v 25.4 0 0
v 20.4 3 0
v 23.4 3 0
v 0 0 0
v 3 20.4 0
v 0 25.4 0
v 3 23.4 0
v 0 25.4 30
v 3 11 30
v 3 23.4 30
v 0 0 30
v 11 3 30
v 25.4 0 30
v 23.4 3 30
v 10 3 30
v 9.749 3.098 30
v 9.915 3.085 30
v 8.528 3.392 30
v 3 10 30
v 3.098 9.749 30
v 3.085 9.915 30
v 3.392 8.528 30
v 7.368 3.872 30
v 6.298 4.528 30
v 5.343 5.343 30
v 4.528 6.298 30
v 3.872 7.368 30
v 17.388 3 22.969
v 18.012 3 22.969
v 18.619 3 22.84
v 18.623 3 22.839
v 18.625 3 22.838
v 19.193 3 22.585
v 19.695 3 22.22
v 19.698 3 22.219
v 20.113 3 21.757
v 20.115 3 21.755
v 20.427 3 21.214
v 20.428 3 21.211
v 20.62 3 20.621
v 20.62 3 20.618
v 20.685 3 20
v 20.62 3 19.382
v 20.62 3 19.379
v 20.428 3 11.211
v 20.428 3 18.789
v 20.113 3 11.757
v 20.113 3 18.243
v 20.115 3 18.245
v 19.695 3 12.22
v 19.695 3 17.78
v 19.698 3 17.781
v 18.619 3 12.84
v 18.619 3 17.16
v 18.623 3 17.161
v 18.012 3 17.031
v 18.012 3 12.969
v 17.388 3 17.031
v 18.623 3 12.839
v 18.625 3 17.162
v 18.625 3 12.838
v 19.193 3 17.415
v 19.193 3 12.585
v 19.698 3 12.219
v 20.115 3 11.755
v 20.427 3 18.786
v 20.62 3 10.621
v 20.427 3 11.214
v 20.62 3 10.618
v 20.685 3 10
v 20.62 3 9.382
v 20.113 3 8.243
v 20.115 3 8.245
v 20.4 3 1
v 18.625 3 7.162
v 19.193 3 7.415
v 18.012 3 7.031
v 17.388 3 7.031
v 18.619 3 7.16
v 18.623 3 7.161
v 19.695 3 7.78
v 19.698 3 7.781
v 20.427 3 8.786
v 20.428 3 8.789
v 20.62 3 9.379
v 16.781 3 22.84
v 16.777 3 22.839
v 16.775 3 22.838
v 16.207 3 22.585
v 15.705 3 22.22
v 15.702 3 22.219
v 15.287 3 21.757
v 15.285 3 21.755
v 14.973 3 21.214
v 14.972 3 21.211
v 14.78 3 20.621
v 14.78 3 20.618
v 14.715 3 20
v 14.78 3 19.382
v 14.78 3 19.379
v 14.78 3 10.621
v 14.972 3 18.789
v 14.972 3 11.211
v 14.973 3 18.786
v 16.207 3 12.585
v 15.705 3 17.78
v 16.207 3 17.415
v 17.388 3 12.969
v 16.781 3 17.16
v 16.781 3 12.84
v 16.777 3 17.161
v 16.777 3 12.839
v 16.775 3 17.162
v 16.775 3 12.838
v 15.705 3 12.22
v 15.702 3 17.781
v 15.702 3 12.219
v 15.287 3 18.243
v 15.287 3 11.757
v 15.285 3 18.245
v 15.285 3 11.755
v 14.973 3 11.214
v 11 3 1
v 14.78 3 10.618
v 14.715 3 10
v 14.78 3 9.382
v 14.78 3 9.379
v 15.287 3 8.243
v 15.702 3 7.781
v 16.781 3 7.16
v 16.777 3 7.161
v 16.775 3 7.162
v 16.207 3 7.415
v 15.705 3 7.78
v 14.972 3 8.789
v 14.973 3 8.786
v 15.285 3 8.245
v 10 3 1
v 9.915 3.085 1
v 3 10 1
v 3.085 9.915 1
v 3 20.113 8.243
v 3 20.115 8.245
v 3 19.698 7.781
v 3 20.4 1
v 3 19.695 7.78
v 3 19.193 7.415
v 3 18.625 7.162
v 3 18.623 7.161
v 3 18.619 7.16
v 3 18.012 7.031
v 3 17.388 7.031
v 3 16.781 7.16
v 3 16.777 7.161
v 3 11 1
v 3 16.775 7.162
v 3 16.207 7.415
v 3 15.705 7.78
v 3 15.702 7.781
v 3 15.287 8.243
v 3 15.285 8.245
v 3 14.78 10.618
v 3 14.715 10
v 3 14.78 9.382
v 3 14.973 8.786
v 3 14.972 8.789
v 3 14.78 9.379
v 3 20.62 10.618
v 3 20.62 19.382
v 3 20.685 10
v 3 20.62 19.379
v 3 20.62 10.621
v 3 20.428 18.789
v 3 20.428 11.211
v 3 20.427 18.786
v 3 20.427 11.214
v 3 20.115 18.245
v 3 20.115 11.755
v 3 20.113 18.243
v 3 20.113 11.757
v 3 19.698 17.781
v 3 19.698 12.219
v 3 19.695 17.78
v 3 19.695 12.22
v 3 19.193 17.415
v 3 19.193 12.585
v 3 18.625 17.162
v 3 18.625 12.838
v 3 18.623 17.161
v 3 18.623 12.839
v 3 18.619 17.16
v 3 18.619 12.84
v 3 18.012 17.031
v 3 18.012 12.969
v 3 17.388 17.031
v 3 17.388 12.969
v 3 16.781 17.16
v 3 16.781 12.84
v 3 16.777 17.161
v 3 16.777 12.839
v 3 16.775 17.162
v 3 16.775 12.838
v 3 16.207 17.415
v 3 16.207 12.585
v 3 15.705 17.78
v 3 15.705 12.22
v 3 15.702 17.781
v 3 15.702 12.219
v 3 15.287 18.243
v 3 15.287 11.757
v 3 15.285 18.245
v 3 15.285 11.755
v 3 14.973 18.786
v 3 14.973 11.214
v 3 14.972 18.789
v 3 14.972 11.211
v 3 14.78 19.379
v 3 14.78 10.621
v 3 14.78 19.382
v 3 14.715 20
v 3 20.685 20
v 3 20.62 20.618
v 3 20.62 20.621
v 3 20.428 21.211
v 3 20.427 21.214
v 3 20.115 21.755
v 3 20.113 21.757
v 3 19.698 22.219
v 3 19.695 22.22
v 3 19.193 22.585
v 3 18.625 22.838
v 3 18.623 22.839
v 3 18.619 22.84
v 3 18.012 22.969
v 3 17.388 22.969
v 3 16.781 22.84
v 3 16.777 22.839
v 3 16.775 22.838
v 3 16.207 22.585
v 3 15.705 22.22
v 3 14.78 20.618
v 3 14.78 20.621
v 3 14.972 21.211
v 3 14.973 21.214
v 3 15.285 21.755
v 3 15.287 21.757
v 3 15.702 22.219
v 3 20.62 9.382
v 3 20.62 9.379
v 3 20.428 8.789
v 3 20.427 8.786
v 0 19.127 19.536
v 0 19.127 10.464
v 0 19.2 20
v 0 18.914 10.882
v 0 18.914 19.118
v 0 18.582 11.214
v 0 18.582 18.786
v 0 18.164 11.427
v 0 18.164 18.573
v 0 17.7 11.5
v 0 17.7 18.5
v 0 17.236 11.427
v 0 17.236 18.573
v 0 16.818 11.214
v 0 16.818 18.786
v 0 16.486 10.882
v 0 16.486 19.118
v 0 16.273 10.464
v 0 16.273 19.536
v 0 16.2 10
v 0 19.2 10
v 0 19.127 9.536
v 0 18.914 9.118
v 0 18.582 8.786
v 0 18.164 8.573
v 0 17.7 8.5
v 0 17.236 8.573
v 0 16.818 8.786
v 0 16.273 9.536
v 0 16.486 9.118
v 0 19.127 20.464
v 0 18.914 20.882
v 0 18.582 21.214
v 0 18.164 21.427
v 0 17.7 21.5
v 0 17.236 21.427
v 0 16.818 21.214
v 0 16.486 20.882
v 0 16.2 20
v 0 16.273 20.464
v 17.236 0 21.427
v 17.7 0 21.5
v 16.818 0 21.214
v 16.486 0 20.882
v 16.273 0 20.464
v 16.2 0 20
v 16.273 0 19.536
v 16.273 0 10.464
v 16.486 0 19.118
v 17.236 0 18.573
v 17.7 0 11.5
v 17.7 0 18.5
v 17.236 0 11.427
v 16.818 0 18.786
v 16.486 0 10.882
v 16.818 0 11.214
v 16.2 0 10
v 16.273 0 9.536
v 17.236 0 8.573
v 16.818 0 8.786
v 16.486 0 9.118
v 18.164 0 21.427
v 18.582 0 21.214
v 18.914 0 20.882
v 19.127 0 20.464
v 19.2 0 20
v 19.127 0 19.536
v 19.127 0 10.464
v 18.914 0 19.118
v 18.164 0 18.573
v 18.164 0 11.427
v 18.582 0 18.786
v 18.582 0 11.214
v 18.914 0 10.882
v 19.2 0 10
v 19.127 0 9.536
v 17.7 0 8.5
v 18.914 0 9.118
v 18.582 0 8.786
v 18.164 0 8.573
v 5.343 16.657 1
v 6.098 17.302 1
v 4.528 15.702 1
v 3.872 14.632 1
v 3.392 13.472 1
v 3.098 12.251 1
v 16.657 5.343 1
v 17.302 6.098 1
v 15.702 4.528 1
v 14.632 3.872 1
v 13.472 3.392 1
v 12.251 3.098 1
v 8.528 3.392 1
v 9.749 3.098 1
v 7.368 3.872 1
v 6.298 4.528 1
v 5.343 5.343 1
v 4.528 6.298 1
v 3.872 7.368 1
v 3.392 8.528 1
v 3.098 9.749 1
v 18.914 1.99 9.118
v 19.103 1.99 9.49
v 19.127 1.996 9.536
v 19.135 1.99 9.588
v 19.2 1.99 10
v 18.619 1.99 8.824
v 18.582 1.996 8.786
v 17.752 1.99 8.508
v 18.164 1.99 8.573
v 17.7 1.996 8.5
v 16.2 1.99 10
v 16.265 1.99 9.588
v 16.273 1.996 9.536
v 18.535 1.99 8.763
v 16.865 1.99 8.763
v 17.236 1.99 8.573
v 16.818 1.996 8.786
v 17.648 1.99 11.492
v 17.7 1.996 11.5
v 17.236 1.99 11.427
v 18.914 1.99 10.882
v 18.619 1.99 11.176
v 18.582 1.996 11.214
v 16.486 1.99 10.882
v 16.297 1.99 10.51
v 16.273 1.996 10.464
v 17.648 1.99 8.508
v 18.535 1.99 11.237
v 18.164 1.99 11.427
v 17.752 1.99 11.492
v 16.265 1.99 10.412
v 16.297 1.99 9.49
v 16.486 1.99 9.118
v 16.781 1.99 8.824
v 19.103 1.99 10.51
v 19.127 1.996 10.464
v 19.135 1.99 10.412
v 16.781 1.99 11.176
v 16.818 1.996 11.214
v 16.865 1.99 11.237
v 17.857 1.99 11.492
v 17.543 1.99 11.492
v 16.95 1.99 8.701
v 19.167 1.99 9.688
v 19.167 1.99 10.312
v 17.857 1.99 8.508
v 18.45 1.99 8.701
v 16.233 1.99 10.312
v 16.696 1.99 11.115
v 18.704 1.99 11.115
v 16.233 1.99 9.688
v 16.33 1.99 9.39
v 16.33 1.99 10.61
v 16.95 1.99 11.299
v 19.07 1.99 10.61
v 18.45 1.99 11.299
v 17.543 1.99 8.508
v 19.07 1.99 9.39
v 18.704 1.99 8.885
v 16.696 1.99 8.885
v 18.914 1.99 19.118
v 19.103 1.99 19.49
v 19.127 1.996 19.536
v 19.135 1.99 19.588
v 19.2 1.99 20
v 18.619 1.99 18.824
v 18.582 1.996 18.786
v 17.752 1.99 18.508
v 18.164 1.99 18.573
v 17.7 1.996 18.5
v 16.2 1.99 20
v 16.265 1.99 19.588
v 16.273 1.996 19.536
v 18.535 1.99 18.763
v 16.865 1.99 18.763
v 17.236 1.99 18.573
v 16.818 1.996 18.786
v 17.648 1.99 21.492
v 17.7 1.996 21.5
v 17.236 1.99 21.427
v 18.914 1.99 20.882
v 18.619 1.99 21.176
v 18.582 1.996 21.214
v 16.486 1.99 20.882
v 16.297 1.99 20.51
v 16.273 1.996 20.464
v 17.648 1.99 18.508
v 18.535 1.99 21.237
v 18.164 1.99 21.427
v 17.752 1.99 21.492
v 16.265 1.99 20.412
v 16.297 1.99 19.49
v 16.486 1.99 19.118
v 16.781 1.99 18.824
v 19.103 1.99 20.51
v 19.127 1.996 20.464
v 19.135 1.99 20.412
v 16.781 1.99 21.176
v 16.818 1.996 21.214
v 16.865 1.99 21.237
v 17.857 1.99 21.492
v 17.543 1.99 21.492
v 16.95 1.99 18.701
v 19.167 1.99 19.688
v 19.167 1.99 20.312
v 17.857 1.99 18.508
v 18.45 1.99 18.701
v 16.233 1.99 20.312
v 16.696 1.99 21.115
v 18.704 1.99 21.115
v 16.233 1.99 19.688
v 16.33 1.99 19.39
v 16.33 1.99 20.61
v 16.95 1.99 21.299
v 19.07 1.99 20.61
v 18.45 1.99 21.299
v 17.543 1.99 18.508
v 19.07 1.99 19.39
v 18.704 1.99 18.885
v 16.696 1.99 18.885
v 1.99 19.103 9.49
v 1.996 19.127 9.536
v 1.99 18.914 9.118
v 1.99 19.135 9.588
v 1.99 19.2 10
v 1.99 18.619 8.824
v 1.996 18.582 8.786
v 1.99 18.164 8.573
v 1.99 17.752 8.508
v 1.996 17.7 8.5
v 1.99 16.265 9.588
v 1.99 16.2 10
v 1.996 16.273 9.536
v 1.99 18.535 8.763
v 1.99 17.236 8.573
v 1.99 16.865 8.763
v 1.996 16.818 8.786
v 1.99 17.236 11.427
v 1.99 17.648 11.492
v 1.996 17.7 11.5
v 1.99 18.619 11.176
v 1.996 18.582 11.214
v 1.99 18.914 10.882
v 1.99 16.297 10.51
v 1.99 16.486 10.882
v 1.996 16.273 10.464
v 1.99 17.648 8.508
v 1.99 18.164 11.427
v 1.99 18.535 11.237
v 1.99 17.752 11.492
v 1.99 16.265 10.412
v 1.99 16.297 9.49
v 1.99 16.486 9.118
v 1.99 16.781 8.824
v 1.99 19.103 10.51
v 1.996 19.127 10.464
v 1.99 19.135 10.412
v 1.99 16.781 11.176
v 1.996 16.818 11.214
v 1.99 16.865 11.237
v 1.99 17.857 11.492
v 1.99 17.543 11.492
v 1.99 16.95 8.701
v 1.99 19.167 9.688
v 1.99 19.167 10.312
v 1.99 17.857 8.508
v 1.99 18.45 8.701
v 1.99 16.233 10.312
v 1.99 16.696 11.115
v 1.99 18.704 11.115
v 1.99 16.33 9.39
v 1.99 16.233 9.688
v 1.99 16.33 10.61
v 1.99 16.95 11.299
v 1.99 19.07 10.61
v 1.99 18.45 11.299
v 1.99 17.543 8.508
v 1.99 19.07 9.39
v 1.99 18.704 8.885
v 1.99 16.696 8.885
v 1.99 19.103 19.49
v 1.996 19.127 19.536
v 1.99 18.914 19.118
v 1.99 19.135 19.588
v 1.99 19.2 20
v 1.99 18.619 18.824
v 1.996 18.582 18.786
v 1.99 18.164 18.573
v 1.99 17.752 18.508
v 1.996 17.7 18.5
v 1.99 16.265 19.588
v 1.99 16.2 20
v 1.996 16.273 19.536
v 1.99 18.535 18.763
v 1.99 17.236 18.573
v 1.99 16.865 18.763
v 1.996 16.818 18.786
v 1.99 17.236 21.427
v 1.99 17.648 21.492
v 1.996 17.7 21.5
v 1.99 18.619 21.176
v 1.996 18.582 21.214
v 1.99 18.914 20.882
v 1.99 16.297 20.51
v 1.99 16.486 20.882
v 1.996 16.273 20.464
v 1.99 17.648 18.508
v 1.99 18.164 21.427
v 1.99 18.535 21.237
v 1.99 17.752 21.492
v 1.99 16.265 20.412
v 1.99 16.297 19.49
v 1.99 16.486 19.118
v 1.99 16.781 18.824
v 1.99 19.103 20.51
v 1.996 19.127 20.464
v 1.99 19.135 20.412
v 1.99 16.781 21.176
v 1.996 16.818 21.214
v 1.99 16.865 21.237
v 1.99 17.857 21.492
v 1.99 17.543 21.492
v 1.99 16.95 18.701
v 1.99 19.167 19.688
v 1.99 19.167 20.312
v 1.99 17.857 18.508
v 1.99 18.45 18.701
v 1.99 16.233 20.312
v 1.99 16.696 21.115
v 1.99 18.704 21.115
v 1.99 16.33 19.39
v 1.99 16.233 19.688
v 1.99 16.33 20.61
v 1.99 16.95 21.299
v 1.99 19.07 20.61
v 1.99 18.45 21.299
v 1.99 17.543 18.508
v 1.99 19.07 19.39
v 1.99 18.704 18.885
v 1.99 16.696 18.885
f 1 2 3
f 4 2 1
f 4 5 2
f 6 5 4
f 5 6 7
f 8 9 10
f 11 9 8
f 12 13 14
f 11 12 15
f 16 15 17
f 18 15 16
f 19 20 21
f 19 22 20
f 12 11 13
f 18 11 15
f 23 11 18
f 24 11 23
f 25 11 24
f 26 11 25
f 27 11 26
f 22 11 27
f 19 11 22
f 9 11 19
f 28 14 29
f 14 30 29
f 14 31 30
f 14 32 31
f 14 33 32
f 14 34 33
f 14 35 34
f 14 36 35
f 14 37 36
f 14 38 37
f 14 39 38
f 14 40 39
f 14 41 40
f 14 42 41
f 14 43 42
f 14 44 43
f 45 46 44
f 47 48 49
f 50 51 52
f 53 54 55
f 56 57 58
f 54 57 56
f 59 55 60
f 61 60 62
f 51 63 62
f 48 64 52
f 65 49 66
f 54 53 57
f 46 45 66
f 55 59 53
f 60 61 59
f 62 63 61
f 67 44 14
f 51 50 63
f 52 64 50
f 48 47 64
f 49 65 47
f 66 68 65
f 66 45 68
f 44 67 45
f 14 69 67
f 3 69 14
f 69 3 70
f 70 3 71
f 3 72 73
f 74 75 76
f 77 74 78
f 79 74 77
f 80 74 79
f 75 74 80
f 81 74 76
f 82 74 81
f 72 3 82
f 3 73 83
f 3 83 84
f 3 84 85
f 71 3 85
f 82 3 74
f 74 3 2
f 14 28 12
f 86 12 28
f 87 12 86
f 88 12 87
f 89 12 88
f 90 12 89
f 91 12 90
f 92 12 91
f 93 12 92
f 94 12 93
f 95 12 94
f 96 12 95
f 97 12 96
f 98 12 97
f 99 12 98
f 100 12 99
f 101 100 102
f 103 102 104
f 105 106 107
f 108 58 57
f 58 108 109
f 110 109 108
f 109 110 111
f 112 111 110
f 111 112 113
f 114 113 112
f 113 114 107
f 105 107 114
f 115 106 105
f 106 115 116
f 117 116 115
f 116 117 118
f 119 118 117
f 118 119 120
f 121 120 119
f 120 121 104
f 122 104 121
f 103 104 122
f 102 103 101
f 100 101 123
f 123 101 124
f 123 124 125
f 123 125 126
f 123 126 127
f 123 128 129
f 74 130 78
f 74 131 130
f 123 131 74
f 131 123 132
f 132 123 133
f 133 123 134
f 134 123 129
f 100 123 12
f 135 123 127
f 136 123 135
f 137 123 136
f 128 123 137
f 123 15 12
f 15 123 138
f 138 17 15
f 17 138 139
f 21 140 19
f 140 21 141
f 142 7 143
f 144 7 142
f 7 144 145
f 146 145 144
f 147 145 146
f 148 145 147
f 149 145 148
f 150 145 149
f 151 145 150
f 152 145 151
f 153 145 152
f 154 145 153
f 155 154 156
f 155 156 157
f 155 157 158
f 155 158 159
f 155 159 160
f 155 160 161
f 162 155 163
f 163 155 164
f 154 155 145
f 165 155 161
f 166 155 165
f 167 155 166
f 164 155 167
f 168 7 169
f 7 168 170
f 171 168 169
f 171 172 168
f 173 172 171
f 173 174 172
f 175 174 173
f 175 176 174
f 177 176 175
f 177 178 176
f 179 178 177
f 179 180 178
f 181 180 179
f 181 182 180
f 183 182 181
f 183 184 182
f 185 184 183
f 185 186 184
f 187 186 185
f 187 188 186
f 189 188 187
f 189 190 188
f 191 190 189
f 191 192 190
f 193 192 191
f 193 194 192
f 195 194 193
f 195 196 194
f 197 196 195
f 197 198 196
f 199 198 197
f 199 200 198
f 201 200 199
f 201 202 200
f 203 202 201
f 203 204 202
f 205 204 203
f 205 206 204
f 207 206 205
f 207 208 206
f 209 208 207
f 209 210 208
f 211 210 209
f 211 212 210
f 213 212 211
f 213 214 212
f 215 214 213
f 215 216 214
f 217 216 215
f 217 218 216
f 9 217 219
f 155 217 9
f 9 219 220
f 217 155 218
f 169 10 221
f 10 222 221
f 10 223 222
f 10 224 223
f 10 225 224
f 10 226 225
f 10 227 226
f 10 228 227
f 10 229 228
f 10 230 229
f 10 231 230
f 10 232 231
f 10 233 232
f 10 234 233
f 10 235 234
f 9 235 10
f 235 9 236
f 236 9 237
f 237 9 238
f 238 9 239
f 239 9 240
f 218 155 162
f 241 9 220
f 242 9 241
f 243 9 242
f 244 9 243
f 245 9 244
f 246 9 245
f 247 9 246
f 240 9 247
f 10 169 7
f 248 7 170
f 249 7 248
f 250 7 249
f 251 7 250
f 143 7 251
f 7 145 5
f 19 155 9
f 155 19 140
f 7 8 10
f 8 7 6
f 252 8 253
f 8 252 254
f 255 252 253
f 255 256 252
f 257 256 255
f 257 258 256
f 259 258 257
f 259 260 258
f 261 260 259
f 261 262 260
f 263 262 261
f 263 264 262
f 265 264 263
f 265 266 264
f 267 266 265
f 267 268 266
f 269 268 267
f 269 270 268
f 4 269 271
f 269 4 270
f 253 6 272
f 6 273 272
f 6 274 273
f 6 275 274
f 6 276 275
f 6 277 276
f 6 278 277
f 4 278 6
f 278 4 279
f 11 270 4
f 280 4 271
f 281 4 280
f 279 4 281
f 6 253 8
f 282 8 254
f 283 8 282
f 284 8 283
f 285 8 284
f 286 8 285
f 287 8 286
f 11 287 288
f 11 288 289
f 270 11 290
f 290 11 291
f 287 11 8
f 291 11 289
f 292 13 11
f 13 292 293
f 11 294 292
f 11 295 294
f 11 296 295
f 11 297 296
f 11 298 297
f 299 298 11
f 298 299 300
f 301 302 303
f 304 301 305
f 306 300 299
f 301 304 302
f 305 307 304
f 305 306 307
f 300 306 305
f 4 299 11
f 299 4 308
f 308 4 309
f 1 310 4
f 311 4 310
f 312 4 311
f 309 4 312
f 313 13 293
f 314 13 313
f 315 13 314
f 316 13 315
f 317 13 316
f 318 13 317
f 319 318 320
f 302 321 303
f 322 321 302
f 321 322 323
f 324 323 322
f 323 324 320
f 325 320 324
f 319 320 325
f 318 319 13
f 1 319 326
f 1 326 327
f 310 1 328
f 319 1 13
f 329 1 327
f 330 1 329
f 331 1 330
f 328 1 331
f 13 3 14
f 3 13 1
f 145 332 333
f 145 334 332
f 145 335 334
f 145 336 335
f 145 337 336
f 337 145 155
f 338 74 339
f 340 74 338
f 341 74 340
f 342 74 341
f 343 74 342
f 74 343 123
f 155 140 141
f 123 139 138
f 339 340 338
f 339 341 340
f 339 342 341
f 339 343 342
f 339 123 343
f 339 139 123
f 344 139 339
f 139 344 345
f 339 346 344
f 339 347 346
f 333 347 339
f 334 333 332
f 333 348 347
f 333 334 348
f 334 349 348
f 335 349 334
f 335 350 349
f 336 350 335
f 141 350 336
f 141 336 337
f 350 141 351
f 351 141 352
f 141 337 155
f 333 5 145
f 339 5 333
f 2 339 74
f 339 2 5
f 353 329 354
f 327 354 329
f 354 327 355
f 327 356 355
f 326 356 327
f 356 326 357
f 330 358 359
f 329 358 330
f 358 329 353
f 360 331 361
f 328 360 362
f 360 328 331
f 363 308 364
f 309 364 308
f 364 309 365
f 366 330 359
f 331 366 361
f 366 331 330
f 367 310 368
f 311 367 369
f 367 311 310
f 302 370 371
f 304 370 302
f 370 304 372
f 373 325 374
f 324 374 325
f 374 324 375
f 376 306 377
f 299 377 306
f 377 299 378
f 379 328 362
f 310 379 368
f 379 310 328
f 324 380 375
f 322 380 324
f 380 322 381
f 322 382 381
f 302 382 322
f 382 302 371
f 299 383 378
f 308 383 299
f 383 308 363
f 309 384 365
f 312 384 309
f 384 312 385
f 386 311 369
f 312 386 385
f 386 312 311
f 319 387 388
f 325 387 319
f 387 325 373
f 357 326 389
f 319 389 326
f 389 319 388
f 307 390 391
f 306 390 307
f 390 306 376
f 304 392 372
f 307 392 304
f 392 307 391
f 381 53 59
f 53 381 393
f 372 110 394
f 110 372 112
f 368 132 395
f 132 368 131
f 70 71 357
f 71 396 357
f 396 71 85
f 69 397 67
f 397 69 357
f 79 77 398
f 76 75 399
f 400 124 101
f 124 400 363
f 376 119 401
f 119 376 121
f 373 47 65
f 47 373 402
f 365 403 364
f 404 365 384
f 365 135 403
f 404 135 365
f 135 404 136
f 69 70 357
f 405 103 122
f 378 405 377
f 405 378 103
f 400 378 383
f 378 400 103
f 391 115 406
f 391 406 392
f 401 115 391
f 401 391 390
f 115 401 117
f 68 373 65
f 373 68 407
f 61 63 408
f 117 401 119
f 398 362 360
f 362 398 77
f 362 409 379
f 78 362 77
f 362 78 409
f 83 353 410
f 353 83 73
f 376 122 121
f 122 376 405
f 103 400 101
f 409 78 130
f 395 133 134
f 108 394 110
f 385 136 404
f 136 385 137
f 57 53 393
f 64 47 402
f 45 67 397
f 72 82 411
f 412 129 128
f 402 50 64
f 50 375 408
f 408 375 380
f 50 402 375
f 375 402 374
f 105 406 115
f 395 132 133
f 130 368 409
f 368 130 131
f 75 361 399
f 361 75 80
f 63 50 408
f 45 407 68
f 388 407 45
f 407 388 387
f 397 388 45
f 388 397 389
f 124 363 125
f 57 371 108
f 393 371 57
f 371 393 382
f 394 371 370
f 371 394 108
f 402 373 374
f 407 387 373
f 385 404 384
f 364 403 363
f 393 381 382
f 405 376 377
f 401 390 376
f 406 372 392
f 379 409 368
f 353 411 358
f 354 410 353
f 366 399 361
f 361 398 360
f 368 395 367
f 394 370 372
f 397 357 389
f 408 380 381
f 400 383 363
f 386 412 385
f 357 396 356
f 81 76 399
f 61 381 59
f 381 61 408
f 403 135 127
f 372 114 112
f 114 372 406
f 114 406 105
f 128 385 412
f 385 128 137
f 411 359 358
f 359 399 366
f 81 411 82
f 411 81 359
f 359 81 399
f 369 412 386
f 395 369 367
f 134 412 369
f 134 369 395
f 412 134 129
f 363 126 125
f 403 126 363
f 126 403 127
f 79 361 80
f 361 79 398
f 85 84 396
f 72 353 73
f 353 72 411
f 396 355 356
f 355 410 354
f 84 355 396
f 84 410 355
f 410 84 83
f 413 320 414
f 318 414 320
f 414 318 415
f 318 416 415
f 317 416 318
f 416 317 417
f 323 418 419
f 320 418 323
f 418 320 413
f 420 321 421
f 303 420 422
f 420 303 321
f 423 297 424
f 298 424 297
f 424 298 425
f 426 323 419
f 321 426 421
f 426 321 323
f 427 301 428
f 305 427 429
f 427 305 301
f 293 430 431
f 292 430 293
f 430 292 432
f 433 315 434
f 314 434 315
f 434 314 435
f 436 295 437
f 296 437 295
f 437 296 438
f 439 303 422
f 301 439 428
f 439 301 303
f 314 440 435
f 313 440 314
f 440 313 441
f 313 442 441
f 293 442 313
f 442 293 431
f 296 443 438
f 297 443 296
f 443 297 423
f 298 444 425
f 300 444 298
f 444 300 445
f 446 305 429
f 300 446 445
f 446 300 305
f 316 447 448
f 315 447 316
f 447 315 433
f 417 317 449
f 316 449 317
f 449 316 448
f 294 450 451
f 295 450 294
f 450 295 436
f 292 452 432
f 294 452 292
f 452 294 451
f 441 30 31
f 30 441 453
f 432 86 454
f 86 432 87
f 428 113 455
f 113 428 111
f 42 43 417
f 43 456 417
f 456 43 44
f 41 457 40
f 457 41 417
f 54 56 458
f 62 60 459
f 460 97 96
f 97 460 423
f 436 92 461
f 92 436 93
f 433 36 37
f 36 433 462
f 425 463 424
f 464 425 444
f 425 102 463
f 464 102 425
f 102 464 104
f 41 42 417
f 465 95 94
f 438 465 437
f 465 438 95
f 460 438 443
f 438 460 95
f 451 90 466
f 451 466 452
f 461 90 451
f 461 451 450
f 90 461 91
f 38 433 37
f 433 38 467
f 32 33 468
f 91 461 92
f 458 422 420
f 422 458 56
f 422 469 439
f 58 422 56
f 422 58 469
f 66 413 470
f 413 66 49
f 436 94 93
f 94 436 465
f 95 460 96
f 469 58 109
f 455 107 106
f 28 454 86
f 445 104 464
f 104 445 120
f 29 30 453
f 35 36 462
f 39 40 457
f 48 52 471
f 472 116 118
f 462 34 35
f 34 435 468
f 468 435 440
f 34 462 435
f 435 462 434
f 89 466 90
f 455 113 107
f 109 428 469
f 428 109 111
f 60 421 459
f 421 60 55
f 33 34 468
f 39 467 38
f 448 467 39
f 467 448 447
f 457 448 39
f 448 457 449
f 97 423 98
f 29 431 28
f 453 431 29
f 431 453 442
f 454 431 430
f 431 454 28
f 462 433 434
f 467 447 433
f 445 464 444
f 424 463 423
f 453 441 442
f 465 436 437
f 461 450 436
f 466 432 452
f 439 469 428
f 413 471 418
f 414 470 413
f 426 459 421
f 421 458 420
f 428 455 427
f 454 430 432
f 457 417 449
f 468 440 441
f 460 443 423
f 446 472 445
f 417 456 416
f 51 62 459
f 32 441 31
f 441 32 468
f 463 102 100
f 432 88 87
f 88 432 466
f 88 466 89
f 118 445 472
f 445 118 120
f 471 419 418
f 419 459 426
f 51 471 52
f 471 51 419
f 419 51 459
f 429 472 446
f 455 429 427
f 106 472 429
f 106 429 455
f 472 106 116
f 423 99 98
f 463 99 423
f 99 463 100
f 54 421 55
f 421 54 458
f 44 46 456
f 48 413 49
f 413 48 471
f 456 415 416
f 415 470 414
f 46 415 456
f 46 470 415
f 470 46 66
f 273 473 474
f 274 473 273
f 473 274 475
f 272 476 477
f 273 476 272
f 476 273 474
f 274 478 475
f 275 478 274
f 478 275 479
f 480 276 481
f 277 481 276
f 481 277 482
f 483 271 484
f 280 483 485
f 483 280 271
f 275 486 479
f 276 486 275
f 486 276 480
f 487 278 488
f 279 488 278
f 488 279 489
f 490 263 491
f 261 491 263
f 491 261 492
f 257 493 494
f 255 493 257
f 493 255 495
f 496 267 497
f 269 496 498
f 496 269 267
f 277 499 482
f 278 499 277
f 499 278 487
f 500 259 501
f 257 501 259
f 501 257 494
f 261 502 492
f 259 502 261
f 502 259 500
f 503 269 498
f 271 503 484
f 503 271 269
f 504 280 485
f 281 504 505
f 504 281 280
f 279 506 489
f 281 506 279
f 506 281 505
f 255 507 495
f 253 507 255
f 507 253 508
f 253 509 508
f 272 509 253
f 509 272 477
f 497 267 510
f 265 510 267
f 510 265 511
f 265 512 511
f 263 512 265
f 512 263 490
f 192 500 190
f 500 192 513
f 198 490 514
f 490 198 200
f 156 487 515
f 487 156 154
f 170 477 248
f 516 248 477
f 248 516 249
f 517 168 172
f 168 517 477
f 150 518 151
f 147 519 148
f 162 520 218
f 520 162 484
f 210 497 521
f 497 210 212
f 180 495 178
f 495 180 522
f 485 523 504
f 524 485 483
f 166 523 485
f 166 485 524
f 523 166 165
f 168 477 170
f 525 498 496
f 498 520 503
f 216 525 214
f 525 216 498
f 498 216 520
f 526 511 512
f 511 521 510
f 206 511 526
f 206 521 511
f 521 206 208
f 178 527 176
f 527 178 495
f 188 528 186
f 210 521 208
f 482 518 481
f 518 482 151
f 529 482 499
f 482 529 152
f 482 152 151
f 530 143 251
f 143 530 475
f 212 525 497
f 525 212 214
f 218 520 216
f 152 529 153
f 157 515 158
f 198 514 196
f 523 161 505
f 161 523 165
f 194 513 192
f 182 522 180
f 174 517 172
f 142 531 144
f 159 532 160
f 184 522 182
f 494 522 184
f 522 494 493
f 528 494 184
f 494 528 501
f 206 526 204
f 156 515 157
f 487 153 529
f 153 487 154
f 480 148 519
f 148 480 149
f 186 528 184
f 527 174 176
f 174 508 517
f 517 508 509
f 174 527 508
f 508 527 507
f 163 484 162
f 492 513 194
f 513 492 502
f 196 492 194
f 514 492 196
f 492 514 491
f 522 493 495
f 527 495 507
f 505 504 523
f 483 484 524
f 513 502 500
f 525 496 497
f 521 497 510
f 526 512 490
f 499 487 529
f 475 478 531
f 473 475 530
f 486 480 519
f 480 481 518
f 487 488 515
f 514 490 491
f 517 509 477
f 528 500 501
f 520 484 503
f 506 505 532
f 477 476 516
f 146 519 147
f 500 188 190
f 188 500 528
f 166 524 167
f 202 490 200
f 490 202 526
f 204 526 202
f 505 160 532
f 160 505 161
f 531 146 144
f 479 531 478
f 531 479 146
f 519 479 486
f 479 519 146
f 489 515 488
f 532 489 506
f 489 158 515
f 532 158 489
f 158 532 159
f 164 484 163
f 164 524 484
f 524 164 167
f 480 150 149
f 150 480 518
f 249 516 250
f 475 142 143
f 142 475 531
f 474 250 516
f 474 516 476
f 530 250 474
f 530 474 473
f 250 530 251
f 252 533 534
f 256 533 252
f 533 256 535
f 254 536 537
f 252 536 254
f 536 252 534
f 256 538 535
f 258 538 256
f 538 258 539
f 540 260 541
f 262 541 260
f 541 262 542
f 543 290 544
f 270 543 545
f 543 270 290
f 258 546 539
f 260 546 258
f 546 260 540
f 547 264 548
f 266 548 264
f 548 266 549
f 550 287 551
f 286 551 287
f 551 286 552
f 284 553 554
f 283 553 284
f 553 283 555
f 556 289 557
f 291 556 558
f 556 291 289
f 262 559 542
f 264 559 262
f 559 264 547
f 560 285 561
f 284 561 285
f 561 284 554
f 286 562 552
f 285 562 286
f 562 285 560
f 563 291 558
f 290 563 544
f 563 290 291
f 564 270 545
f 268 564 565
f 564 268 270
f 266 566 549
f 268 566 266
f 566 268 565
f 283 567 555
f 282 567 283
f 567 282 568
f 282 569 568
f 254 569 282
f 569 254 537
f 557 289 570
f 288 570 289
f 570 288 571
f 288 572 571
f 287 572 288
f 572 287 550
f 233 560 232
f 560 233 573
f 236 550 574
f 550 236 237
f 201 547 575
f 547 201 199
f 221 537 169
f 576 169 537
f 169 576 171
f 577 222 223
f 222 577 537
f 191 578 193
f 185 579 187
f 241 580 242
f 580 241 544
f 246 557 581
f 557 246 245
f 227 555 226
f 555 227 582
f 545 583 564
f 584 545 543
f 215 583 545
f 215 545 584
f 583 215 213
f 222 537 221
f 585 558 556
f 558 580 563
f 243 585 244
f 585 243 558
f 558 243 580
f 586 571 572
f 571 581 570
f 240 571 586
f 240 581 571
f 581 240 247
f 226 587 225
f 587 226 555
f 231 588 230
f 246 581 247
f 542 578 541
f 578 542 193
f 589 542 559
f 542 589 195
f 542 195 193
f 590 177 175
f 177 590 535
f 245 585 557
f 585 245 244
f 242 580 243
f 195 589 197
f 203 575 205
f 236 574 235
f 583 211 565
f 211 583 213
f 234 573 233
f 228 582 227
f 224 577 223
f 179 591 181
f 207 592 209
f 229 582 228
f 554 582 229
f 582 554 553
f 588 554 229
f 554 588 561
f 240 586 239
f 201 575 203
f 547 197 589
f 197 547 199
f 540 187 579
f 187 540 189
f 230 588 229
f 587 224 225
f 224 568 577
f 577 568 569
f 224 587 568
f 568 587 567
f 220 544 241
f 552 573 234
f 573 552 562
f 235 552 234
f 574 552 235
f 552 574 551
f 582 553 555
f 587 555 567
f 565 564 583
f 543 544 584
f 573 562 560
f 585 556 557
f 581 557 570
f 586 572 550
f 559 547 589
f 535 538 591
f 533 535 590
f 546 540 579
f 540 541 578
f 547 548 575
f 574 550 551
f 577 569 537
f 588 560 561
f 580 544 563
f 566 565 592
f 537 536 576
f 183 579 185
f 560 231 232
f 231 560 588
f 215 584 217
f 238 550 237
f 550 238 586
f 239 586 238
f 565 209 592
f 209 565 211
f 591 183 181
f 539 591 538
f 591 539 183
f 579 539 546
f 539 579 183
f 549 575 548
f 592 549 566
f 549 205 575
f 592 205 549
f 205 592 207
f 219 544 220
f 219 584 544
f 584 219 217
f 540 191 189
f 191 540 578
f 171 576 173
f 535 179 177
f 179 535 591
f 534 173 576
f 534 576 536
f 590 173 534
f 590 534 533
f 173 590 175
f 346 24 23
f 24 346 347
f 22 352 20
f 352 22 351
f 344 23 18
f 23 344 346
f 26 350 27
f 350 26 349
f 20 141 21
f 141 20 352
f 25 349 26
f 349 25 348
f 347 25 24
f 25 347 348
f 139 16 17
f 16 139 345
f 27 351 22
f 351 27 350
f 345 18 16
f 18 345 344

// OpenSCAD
height=30;
size=1*25.4;
holes=1;
vholes=2;
dist=(size-10)/(holes+1);
vdist=(height/(vholes+1));
echo(str("dist: ", dist, " vdist: ", vdist));
difference() {
  union(){
    linear_extrude(height,convexity=10) polygon([[0,0],[size,0],[size-2,3],[10,3],[3,10],[3,size-2],[0,size]]);
    linear_extrude(1) polygon([[size-5,3],[3,size-5],[0,0]]);
  }
  translate([11,11,1]) cylinder(d=16,h=height+.02,$fn=40);
  #for(m=[0,1])
    mirror([m,-m]) for(i=[0:holes-1],j=[0:vholes-1]) translate([10+((i+1)*dist),-.01,(j+1)*vdist]) rotate([-90,0]) {
      cylinder(d=3,h=4,$fn=20);
      translate([0,0,2]) cylinder(d1=3,d2=6,h=1.02,$fn=30);
    }
}
